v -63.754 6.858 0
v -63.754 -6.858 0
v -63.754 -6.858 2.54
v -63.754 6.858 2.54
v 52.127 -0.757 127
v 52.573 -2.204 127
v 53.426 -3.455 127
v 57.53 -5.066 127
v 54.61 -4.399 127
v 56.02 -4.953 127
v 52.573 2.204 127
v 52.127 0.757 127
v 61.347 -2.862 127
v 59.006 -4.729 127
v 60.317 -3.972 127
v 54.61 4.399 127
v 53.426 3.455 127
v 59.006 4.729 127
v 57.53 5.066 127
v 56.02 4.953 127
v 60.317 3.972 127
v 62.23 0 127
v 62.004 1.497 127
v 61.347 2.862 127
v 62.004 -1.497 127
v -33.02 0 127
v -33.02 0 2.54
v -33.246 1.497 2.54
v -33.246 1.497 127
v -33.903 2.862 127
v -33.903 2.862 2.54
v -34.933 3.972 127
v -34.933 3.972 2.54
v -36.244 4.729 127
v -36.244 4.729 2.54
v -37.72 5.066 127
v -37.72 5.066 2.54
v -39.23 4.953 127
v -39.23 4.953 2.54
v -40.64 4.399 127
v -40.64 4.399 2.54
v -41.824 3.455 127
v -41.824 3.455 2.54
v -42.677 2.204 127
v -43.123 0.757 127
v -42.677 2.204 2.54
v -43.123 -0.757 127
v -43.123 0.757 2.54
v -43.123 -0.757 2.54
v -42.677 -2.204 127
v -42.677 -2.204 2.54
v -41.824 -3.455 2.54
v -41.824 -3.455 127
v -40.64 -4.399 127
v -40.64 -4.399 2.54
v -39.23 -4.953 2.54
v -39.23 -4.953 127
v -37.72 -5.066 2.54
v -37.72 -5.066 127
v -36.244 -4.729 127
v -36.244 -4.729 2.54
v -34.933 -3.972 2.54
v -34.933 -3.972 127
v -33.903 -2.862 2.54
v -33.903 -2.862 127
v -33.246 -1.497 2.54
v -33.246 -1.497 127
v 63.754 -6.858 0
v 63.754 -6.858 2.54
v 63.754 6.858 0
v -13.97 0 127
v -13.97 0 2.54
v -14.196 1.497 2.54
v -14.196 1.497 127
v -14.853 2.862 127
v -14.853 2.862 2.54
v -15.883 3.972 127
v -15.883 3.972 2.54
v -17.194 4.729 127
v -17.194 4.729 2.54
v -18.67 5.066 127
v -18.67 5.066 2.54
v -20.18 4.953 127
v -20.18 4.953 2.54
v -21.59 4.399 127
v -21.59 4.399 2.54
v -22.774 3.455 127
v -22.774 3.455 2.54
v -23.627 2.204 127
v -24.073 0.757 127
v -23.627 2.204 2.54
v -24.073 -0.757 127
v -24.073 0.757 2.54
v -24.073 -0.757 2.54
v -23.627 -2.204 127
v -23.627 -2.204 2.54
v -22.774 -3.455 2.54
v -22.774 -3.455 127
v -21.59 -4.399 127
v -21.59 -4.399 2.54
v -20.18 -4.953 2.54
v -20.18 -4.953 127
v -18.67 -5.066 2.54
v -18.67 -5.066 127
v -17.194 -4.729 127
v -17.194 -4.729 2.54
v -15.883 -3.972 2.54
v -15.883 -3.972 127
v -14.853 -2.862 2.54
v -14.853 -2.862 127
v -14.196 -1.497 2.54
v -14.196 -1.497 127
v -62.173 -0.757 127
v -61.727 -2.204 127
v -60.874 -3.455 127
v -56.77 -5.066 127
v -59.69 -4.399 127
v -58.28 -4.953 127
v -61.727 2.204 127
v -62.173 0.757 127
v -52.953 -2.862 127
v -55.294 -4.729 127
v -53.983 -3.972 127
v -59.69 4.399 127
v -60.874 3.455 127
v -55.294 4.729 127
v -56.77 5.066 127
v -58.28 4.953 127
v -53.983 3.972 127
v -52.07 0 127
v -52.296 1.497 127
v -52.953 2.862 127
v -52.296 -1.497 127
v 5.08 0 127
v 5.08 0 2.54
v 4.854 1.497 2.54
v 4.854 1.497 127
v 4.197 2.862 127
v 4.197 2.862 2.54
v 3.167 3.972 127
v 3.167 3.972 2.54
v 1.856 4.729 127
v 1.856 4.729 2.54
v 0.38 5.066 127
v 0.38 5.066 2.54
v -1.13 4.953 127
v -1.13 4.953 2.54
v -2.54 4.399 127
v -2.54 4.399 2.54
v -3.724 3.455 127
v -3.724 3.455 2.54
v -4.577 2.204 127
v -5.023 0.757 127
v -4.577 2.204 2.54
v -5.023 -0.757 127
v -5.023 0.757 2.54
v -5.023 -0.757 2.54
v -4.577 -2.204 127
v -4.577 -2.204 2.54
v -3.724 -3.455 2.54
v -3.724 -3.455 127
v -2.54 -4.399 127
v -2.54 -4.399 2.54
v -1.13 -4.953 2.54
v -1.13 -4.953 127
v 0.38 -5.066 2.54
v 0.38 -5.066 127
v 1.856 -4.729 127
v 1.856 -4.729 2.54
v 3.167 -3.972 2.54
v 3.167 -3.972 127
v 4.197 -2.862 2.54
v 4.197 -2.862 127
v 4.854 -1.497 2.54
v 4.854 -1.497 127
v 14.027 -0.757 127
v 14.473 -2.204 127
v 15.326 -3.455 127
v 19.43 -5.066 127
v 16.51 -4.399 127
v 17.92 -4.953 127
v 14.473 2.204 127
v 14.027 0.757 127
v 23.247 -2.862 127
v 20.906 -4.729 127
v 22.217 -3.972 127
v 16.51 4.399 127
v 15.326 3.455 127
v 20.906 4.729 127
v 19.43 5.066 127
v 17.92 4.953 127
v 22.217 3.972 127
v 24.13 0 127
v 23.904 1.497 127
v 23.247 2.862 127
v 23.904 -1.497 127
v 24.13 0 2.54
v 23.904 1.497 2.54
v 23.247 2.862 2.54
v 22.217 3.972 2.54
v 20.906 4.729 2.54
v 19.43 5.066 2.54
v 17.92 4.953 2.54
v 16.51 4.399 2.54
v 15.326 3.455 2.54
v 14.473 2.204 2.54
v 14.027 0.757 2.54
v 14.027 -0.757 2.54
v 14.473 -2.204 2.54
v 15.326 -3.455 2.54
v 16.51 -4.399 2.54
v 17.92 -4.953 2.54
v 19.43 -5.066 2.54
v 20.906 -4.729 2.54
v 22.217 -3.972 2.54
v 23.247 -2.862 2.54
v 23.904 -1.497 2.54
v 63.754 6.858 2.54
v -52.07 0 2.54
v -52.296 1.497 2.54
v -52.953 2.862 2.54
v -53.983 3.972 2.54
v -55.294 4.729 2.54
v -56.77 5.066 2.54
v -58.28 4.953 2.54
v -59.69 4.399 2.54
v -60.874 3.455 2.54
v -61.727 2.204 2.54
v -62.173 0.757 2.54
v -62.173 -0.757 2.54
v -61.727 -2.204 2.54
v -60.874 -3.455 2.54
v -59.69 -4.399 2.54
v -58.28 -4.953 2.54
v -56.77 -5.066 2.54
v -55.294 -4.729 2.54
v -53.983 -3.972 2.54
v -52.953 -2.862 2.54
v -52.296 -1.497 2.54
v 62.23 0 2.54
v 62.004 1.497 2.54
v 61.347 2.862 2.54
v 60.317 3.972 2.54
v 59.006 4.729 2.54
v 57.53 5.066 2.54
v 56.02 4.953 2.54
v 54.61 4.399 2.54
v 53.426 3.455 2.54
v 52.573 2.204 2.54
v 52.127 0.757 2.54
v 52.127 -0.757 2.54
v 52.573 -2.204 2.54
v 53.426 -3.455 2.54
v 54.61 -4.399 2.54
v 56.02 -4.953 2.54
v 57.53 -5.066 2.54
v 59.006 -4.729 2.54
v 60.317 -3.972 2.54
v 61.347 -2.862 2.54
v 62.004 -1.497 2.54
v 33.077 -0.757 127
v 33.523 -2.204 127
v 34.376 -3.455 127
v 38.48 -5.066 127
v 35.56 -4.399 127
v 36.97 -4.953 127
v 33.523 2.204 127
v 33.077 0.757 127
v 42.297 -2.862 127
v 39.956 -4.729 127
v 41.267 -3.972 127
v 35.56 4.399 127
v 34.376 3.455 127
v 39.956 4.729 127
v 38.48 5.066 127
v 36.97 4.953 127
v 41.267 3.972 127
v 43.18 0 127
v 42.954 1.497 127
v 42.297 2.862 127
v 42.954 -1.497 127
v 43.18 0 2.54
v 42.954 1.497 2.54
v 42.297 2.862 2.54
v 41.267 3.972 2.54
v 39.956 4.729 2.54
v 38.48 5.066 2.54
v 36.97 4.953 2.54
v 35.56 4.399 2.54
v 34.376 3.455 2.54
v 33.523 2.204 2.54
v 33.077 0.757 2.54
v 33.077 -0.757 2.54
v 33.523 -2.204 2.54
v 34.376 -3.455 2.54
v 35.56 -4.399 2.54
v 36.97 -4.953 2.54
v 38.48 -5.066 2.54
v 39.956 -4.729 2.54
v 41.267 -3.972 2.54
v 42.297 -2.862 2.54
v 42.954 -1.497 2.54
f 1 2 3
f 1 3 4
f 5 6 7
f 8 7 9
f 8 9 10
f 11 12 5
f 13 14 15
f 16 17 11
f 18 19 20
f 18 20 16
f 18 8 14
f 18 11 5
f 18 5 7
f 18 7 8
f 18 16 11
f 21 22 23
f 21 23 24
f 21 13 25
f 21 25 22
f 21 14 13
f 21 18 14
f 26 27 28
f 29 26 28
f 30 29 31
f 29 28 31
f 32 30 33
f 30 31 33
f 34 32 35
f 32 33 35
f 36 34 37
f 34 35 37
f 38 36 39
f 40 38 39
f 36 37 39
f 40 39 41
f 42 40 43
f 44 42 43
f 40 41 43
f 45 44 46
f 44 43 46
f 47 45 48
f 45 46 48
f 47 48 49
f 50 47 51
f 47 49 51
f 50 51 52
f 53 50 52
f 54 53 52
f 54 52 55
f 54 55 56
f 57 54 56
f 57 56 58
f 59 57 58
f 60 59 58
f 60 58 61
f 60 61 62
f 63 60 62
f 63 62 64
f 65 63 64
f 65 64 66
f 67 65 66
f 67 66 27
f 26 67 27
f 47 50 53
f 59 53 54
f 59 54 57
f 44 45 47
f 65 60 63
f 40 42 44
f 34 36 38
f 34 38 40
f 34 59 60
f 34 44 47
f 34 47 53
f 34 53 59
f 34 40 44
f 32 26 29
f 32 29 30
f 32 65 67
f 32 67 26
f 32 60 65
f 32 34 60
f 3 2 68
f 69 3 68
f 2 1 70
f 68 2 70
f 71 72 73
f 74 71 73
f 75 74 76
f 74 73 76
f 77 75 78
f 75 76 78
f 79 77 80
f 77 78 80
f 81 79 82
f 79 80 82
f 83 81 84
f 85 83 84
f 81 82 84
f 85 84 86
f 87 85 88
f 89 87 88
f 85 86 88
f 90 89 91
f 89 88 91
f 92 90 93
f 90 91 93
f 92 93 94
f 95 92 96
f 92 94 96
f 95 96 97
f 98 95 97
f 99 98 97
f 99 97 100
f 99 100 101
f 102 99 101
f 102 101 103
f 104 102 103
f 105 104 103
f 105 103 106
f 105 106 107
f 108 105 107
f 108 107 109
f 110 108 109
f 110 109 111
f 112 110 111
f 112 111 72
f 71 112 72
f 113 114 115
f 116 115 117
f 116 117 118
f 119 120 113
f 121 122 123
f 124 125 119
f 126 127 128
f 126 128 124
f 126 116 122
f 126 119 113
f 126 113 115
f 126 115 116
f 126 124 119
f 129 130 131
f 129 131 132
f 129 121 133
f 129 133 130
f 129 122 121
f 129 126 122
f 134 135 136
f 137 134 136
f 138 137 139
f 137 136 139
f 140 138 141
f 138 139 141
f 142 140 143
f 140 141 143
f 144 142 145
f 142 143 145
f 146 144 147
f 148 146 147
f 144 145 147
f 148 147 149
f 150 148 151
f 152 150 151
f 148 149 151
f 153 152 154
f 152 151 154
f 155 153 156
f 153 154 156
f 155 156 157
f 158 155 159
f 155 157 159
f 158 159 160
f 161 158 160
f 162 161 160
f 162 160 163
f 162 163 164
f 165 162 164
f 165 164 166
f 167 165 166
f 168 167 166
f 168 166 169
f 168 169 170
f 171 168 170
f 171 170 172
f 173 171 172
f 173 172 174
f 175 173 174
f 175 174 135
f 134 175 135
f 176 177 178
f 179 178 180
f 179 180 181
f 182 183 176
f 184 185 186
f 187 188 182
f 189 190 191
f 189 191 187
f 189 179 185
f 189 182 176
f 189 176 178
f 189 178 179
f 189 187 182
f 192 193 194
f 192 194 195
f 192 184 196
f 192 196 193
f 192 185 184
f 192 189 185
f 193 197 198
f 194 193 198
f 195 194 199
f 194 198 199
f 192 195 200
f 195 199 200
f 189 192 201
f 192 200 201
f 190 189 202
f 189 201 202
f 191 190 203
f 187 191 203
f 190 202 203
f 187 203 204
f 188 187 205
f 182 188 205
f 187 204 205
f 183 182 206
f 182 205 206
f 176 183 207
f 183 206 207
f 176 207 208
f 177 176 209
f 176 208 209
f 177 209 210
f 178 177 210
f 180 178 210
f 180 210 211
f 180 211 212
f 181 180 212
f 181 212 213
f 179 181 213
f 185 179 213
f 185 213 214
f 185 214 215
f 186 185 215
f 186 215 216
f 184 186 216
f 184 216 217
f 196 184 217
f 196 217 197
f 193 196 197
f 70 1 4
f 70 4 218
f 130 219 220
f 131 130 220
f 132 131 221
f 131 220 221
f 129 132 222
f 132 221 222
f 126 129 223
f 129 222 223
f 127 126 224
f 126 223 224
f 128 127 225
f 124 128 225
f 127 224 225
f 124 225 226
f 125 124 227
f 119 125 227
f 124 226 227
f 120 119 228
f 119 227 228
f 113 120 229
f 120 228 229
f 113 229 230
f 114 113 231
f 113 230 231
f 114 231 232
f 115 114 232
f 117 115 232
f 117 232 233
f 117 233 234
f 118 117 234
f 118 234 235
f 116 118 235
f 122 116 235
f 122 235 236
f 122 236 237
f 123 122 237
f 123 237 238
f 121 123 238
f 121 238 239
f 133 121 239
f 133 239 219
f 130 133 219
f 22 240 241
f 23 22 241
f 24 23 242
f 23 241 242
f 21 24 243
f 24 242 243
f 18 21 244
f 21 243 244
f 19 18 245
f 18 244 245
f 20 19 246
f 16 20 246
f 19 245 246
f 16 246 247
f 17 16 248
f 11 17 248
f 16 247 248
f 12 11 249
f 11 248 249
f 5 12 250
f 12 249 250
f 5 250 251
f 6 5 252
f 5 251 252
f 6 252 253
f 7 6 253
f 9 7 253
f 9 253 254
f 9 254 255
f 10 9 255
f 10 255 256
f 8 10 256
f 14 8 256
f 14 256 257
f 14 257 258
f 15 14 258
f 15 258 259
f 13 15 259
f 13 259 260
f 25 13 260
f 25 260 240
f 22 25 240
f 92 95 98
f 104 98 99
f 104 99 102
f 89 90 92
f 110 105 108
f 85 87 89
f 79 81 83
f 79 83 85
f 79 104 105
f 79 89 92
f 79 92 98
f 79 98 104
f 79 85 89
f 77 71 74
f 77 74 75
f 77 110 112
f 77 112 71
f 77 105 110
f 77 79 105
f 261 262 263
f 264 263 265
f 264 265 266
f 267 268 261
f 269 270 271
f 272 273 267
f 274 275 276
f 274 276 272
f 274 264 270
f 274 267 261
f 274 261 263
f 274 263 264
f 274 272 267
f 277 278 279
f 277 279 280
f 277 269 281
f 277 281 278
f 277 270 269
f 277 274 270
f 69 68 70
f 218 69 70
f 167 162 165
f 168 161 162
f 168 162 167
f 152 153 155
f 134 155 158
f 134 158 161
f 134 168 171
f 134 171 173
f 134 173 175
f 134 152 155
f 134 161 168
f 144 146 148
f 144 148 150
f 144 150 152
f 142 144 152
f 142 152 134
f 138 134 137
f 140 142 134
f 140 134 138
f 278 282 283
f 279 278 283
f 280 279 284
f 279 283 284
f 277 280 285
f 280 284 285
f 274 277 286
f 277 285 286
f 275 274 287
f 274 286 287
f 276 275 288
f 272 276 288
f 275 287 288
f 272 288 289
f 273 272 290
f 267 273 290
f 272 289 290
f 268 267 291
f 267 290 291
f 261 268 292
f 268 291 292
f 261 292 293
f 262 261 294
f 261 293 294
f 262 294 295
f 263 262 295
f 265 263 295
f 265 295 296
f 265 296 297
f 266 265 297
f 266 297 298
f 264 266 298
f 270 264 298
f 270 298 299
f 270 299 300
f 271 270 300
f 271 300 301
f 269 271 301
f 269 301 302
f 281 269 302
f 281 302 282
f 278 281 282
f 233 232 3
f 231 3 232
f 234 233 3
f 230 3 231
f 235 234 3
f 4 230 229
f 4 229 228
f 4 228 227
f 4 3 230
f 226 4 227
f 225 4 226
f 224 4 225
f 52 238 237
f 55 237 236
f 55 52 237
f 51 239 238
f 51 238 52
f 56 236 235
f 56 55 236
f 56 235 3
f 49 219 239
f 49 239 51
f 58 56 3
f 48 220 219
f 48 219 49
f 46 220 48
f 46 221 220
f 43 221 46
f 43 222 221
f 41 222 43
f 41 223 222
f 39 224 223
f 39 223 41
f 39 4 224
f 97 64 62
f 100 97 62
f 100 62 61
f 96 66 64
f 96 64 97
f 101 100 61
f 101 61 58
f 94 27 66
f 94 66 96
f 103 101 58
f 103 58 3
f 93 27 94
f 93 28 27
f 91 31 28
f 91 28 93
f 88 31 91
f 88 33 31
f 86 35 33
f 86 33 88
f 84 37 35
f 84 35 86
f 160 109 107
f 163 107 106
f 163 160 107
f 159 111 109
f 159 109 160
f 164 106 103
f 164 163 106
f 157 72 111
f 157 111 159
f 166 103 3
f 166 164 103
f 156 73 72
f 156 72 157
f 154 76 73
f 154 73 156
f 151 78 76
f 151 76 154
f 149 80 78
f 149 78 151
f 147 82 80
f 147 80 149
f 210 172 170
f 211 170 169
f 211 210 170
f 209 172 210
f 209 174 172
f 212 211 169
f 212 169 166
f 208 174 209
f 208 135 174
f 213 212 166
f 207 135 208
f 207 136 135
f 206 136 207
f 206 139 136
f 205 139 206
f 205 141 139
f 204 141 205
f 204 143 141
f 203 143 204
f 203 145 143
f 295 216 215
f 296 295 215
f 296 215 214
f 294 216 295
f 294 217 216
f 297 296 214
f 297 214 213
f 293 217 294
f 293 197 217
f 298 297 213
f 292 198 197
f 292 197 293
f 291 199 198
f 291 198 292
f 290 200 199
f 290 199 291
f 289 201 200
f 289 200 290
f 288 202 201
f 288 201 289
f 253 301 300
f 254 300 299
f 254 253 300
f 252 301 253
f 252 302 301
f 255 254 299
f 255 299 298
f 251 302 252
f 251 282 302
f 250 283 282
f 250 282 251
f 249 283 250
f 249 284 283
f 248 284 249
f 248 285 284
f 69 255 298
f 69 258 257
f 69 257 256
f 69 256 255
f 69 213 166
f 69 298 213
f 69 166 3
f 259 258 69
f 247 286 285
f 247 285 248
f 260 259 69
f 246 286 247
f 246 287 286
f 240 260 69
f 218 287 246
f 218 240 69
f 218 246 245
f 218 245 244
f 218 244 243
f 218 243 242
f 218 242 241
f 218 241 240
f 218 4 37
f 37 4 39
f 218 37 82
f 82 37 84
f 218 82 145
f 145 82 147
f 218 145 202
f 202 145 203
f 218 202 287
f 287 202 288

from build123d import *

# Parameters (mm, degrees)
F0_W     = 127.508
F0_H     = 13.716
F1_DEPTH = 2.54
F2_R     = 5.08
F3_DEPTH = 127


with BuildPart() as f1:
    # F0 (on Top) → F1 (new body)
    with BuildSketch(Plane.XY):
        Rectangle(F0_W, F0_H)
    extrude(amount=F1_DEPTH)

    # F2 (on Top) → F3 (join)
    with BuildSketch(Plane.XY):
        Circle(F2_R)
        with Locations((19.05, 0)):
            Circle(F2_R)
        with Locations((38.1, 0)):
            Circle(F2_R)
        with Locations((57.15, 0)):
            Circle(F2_R)
        with Locations((-19.05, 0)):
            Circle(F2_R)
        with Locations((-38.1, 0)):
            Circle(F2_R)
        with Locations((-57.15, 0)):
            Circle(F2_R)
    extrude(amount=F3_DEPTH)


solid = f1.part
